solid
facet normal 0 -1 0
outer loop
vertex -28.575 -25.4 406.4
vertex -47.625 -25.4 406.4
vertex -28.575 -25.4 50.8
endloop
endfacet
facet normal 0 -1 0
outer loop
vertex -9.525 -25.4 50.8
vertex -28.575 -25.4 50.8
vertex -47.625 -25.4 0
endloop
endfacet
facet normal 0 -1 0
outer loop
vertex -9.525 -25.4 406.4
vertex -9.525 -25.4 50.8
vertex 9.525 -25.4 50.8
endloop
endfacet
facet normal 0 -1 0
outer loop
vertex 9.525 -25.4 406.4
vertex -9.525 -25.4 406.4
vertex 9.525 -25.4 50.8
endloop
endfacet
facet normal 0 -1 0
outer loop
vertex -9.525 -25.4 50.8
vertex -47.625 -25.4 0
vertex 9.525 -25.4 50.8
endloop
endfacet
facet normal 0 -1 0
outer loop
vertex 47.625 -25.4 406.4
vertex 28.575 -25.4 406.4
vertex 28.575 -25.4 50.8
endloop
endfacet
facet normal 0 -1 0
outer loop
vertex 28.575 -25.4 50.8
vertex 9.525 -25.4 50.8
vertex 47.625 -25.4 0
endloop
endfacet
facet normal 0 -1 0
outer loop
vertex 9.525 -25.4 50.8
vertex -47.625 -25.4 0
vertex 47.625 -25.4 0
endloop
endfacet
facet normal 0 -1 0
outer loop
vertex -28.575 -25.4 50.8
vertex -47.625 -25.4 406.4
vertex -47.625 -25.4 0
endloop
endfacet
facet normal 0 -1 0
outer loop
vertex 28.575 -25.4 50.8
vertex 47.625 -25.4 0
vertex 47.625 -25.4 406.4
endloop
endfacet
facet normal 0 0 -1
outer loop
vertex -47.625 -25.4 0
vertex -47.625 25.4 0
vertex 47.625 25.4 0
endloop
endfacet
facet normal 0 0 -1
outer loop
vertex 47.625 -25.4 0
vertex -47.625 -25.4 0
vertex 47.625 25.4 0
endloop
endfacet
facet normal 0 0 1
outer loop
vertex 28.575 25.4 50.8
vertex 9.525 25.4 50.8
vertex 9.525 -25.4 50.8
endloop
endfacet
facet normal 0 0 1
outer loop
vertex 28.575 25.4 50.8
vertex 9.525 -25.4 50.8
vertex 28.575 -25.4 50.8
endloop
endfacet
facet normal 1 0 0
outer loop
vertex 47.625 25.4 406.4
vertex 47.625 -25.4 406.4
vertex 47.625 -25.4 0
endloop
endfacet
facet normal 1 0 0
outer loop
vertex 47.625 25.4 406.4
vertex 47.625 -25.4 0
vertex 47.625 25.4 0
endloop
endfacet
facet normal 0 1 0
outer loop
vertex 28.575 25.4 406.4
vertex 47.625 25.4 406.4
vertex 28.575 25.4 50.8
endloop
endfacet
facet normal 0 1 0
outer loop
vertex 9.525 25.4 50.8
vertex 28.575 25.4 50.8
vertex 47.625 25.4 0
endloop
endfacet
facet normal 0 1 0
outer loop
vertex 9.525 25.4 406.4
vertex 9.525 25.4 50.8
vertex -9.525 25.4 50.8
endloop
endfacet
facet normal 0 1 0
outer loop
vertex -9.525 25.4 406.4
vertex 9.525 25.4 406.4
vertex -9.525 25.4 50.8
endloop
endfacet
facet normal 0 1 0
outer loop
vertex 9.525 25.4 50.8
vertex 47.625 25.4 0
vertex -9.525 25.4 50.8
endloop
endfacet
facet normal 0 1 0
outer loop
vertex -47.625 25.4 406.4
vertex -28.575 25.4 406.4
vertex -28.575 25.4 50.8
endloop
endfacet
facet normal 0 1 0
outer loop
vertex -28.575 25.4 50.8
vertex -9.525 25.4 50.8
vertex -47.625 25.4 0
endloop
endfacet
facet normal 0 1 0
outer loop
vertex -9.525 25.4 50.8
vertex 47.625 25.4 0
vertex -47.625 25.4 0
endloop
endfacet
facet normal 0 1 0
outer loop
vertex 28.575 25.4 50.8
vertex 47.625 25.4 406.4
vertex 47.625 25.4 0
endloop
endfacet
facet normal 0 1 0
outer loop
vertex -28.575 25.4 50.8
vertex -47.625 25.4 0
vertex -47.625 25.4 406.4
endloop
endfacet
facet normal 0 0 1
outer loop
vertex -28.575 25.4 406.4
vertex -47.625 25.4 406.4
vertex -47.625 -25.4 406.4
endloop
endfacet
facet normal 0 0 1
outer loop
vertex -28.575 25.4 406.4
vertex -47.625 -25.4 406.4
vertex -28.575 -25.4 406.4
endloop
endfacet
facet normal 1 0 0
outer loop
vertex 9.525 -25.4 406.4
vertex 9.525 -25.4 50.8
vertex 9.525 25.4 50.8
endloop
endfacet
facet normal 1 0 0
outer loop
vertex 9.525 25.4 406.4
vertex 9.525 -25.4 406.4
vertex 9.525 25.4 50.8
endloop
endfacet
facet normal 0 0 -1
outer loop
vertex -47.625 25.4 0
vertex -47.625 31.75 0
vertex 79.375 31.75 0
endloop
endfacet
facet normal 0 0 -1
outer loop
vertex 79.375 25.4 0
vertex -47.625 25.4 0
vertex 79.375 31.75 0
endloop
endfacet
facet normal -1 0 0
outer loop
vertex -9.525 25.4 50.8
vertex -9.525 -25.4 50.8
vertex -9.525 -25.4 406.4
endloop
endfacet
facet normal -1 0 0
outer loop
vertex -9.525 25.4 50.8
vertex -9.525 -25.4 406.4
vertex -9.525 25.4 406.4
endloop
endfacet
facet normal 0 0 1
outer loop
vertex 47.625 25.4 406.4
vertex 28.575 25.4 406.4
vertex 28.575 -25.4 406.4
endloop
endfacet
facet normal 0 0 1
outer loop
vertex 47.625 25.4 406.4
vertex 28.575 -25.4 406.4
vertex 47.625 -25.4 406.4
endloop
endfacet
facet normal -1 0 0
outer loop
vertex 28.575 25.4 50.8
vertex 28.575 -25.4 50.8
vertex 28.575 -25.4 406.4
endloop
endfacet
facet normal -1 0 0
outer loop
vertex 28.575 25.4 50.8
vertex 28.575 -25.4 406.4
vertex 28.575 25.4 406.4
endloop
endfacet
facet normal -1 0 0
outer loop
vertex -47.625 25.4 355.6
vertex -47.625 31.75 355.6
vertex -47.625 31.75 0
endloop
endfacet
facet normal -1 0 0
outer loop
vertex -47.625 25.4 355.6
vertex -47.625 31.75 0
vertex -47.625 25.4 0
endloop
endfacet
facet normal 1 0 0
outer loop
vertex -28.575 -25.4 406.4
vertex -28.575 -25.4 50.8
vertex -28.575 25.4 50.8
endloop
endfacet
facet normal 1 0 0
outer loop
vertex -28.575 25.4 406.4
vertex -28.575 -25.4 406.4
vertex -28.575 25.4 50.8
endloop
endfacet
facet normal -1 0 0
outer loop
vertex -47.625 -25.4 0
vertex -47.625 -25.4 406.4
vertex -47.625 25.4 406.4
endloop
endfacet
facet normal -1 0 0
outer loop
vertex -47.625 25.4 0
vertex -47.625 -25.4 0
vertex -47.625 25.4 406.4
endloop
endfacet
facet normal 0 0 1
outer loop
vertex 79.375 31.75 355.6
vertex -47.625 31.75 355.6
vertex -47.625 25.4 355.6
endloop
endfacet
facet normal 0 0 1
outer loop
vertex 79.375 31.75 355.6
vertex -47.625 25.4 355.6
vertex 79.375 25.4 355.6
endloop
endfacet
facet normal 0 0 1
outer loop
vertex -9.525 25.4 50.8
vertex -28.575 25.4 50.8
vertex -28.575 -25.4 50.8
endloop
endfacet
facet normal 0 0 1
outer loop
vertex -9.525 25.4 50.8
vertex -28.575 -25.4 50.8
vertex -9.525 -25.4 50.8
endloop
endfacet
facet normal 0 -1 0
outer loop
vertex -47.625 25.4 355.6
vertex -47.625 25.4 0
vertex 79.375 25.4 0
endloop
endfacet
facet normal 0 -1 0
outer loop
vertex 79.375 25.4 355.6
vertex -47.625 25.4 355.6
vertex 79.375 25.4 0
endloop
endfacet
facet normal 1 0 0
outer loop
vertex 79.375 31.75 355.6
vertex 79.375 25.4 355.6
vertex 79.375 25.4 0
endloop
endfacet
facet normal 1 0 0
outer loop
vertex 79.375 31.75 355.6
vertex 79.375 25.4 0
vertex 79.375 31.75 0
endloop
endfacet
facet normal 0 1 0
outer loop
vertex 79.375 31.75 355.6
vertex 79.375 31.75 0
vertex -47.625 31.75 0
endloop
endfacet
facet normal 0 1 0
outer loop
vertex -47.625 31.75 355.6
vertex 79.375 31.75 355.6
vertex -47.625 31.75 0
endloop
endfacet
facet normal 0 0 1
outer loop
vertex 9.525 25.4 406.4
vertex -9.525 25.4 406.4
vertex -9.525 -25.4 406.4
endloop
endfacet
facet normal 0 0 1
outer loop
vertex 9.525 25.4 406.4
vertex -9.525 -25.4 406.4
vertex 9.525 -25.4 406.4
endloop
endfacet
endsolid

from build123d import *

# Parameters (mm, degrees)
F0_W     = 19.05
F0_H     = 50.8
F1_DEPTH = 50.8
F2_DEPTH = 406.4
F4_DEPTH = 355.6


with BuildPart() as f1:
    # F0 (on Top) → F1 (new body)
    with BuildSketch(Plane.XY):
        with Locations((-38.1, 0)):
            Rectangle(F0_W, F0_H)
        Rectangle(F0_W, F0_H)
        with Locations((38.1, 0)):
            Rectangle(F0_W, F0_H)
        with Locations((-19.05, 0)):
            Rectangle(F0_W, F0_H)
        with Locations((19.05, 0)):
            Rectangle(F0_W, F0_H)
    extrude(amount=F1_DEPTH)

    # F0 (on Top) → F2 (join)
    with BuildSketch(Plane.XY):
        Rectangle(F0_W, F0_H)
        with Locations((-38.1, 0)):
            Rectangle(F0_W, F0_H)
        with Locations((38.1, 0)):
            Rectangle(F0_W, F0_H)
    extrude(amount=F2_DEPTH)


with BuildPart() as f4:
    # F3 (on Top) → F4 (new body)
    with BuildSketch(Plane.XY):
        Polygon((-47.625, 31.75), (-47.625, 25.4), (-28.575, 25.4), (79.375, 25.4), (79.375, 31.75), align=None)
    extrude(amount=F4_DEPTH)


solid = Compound([f1.part, f4.part])
